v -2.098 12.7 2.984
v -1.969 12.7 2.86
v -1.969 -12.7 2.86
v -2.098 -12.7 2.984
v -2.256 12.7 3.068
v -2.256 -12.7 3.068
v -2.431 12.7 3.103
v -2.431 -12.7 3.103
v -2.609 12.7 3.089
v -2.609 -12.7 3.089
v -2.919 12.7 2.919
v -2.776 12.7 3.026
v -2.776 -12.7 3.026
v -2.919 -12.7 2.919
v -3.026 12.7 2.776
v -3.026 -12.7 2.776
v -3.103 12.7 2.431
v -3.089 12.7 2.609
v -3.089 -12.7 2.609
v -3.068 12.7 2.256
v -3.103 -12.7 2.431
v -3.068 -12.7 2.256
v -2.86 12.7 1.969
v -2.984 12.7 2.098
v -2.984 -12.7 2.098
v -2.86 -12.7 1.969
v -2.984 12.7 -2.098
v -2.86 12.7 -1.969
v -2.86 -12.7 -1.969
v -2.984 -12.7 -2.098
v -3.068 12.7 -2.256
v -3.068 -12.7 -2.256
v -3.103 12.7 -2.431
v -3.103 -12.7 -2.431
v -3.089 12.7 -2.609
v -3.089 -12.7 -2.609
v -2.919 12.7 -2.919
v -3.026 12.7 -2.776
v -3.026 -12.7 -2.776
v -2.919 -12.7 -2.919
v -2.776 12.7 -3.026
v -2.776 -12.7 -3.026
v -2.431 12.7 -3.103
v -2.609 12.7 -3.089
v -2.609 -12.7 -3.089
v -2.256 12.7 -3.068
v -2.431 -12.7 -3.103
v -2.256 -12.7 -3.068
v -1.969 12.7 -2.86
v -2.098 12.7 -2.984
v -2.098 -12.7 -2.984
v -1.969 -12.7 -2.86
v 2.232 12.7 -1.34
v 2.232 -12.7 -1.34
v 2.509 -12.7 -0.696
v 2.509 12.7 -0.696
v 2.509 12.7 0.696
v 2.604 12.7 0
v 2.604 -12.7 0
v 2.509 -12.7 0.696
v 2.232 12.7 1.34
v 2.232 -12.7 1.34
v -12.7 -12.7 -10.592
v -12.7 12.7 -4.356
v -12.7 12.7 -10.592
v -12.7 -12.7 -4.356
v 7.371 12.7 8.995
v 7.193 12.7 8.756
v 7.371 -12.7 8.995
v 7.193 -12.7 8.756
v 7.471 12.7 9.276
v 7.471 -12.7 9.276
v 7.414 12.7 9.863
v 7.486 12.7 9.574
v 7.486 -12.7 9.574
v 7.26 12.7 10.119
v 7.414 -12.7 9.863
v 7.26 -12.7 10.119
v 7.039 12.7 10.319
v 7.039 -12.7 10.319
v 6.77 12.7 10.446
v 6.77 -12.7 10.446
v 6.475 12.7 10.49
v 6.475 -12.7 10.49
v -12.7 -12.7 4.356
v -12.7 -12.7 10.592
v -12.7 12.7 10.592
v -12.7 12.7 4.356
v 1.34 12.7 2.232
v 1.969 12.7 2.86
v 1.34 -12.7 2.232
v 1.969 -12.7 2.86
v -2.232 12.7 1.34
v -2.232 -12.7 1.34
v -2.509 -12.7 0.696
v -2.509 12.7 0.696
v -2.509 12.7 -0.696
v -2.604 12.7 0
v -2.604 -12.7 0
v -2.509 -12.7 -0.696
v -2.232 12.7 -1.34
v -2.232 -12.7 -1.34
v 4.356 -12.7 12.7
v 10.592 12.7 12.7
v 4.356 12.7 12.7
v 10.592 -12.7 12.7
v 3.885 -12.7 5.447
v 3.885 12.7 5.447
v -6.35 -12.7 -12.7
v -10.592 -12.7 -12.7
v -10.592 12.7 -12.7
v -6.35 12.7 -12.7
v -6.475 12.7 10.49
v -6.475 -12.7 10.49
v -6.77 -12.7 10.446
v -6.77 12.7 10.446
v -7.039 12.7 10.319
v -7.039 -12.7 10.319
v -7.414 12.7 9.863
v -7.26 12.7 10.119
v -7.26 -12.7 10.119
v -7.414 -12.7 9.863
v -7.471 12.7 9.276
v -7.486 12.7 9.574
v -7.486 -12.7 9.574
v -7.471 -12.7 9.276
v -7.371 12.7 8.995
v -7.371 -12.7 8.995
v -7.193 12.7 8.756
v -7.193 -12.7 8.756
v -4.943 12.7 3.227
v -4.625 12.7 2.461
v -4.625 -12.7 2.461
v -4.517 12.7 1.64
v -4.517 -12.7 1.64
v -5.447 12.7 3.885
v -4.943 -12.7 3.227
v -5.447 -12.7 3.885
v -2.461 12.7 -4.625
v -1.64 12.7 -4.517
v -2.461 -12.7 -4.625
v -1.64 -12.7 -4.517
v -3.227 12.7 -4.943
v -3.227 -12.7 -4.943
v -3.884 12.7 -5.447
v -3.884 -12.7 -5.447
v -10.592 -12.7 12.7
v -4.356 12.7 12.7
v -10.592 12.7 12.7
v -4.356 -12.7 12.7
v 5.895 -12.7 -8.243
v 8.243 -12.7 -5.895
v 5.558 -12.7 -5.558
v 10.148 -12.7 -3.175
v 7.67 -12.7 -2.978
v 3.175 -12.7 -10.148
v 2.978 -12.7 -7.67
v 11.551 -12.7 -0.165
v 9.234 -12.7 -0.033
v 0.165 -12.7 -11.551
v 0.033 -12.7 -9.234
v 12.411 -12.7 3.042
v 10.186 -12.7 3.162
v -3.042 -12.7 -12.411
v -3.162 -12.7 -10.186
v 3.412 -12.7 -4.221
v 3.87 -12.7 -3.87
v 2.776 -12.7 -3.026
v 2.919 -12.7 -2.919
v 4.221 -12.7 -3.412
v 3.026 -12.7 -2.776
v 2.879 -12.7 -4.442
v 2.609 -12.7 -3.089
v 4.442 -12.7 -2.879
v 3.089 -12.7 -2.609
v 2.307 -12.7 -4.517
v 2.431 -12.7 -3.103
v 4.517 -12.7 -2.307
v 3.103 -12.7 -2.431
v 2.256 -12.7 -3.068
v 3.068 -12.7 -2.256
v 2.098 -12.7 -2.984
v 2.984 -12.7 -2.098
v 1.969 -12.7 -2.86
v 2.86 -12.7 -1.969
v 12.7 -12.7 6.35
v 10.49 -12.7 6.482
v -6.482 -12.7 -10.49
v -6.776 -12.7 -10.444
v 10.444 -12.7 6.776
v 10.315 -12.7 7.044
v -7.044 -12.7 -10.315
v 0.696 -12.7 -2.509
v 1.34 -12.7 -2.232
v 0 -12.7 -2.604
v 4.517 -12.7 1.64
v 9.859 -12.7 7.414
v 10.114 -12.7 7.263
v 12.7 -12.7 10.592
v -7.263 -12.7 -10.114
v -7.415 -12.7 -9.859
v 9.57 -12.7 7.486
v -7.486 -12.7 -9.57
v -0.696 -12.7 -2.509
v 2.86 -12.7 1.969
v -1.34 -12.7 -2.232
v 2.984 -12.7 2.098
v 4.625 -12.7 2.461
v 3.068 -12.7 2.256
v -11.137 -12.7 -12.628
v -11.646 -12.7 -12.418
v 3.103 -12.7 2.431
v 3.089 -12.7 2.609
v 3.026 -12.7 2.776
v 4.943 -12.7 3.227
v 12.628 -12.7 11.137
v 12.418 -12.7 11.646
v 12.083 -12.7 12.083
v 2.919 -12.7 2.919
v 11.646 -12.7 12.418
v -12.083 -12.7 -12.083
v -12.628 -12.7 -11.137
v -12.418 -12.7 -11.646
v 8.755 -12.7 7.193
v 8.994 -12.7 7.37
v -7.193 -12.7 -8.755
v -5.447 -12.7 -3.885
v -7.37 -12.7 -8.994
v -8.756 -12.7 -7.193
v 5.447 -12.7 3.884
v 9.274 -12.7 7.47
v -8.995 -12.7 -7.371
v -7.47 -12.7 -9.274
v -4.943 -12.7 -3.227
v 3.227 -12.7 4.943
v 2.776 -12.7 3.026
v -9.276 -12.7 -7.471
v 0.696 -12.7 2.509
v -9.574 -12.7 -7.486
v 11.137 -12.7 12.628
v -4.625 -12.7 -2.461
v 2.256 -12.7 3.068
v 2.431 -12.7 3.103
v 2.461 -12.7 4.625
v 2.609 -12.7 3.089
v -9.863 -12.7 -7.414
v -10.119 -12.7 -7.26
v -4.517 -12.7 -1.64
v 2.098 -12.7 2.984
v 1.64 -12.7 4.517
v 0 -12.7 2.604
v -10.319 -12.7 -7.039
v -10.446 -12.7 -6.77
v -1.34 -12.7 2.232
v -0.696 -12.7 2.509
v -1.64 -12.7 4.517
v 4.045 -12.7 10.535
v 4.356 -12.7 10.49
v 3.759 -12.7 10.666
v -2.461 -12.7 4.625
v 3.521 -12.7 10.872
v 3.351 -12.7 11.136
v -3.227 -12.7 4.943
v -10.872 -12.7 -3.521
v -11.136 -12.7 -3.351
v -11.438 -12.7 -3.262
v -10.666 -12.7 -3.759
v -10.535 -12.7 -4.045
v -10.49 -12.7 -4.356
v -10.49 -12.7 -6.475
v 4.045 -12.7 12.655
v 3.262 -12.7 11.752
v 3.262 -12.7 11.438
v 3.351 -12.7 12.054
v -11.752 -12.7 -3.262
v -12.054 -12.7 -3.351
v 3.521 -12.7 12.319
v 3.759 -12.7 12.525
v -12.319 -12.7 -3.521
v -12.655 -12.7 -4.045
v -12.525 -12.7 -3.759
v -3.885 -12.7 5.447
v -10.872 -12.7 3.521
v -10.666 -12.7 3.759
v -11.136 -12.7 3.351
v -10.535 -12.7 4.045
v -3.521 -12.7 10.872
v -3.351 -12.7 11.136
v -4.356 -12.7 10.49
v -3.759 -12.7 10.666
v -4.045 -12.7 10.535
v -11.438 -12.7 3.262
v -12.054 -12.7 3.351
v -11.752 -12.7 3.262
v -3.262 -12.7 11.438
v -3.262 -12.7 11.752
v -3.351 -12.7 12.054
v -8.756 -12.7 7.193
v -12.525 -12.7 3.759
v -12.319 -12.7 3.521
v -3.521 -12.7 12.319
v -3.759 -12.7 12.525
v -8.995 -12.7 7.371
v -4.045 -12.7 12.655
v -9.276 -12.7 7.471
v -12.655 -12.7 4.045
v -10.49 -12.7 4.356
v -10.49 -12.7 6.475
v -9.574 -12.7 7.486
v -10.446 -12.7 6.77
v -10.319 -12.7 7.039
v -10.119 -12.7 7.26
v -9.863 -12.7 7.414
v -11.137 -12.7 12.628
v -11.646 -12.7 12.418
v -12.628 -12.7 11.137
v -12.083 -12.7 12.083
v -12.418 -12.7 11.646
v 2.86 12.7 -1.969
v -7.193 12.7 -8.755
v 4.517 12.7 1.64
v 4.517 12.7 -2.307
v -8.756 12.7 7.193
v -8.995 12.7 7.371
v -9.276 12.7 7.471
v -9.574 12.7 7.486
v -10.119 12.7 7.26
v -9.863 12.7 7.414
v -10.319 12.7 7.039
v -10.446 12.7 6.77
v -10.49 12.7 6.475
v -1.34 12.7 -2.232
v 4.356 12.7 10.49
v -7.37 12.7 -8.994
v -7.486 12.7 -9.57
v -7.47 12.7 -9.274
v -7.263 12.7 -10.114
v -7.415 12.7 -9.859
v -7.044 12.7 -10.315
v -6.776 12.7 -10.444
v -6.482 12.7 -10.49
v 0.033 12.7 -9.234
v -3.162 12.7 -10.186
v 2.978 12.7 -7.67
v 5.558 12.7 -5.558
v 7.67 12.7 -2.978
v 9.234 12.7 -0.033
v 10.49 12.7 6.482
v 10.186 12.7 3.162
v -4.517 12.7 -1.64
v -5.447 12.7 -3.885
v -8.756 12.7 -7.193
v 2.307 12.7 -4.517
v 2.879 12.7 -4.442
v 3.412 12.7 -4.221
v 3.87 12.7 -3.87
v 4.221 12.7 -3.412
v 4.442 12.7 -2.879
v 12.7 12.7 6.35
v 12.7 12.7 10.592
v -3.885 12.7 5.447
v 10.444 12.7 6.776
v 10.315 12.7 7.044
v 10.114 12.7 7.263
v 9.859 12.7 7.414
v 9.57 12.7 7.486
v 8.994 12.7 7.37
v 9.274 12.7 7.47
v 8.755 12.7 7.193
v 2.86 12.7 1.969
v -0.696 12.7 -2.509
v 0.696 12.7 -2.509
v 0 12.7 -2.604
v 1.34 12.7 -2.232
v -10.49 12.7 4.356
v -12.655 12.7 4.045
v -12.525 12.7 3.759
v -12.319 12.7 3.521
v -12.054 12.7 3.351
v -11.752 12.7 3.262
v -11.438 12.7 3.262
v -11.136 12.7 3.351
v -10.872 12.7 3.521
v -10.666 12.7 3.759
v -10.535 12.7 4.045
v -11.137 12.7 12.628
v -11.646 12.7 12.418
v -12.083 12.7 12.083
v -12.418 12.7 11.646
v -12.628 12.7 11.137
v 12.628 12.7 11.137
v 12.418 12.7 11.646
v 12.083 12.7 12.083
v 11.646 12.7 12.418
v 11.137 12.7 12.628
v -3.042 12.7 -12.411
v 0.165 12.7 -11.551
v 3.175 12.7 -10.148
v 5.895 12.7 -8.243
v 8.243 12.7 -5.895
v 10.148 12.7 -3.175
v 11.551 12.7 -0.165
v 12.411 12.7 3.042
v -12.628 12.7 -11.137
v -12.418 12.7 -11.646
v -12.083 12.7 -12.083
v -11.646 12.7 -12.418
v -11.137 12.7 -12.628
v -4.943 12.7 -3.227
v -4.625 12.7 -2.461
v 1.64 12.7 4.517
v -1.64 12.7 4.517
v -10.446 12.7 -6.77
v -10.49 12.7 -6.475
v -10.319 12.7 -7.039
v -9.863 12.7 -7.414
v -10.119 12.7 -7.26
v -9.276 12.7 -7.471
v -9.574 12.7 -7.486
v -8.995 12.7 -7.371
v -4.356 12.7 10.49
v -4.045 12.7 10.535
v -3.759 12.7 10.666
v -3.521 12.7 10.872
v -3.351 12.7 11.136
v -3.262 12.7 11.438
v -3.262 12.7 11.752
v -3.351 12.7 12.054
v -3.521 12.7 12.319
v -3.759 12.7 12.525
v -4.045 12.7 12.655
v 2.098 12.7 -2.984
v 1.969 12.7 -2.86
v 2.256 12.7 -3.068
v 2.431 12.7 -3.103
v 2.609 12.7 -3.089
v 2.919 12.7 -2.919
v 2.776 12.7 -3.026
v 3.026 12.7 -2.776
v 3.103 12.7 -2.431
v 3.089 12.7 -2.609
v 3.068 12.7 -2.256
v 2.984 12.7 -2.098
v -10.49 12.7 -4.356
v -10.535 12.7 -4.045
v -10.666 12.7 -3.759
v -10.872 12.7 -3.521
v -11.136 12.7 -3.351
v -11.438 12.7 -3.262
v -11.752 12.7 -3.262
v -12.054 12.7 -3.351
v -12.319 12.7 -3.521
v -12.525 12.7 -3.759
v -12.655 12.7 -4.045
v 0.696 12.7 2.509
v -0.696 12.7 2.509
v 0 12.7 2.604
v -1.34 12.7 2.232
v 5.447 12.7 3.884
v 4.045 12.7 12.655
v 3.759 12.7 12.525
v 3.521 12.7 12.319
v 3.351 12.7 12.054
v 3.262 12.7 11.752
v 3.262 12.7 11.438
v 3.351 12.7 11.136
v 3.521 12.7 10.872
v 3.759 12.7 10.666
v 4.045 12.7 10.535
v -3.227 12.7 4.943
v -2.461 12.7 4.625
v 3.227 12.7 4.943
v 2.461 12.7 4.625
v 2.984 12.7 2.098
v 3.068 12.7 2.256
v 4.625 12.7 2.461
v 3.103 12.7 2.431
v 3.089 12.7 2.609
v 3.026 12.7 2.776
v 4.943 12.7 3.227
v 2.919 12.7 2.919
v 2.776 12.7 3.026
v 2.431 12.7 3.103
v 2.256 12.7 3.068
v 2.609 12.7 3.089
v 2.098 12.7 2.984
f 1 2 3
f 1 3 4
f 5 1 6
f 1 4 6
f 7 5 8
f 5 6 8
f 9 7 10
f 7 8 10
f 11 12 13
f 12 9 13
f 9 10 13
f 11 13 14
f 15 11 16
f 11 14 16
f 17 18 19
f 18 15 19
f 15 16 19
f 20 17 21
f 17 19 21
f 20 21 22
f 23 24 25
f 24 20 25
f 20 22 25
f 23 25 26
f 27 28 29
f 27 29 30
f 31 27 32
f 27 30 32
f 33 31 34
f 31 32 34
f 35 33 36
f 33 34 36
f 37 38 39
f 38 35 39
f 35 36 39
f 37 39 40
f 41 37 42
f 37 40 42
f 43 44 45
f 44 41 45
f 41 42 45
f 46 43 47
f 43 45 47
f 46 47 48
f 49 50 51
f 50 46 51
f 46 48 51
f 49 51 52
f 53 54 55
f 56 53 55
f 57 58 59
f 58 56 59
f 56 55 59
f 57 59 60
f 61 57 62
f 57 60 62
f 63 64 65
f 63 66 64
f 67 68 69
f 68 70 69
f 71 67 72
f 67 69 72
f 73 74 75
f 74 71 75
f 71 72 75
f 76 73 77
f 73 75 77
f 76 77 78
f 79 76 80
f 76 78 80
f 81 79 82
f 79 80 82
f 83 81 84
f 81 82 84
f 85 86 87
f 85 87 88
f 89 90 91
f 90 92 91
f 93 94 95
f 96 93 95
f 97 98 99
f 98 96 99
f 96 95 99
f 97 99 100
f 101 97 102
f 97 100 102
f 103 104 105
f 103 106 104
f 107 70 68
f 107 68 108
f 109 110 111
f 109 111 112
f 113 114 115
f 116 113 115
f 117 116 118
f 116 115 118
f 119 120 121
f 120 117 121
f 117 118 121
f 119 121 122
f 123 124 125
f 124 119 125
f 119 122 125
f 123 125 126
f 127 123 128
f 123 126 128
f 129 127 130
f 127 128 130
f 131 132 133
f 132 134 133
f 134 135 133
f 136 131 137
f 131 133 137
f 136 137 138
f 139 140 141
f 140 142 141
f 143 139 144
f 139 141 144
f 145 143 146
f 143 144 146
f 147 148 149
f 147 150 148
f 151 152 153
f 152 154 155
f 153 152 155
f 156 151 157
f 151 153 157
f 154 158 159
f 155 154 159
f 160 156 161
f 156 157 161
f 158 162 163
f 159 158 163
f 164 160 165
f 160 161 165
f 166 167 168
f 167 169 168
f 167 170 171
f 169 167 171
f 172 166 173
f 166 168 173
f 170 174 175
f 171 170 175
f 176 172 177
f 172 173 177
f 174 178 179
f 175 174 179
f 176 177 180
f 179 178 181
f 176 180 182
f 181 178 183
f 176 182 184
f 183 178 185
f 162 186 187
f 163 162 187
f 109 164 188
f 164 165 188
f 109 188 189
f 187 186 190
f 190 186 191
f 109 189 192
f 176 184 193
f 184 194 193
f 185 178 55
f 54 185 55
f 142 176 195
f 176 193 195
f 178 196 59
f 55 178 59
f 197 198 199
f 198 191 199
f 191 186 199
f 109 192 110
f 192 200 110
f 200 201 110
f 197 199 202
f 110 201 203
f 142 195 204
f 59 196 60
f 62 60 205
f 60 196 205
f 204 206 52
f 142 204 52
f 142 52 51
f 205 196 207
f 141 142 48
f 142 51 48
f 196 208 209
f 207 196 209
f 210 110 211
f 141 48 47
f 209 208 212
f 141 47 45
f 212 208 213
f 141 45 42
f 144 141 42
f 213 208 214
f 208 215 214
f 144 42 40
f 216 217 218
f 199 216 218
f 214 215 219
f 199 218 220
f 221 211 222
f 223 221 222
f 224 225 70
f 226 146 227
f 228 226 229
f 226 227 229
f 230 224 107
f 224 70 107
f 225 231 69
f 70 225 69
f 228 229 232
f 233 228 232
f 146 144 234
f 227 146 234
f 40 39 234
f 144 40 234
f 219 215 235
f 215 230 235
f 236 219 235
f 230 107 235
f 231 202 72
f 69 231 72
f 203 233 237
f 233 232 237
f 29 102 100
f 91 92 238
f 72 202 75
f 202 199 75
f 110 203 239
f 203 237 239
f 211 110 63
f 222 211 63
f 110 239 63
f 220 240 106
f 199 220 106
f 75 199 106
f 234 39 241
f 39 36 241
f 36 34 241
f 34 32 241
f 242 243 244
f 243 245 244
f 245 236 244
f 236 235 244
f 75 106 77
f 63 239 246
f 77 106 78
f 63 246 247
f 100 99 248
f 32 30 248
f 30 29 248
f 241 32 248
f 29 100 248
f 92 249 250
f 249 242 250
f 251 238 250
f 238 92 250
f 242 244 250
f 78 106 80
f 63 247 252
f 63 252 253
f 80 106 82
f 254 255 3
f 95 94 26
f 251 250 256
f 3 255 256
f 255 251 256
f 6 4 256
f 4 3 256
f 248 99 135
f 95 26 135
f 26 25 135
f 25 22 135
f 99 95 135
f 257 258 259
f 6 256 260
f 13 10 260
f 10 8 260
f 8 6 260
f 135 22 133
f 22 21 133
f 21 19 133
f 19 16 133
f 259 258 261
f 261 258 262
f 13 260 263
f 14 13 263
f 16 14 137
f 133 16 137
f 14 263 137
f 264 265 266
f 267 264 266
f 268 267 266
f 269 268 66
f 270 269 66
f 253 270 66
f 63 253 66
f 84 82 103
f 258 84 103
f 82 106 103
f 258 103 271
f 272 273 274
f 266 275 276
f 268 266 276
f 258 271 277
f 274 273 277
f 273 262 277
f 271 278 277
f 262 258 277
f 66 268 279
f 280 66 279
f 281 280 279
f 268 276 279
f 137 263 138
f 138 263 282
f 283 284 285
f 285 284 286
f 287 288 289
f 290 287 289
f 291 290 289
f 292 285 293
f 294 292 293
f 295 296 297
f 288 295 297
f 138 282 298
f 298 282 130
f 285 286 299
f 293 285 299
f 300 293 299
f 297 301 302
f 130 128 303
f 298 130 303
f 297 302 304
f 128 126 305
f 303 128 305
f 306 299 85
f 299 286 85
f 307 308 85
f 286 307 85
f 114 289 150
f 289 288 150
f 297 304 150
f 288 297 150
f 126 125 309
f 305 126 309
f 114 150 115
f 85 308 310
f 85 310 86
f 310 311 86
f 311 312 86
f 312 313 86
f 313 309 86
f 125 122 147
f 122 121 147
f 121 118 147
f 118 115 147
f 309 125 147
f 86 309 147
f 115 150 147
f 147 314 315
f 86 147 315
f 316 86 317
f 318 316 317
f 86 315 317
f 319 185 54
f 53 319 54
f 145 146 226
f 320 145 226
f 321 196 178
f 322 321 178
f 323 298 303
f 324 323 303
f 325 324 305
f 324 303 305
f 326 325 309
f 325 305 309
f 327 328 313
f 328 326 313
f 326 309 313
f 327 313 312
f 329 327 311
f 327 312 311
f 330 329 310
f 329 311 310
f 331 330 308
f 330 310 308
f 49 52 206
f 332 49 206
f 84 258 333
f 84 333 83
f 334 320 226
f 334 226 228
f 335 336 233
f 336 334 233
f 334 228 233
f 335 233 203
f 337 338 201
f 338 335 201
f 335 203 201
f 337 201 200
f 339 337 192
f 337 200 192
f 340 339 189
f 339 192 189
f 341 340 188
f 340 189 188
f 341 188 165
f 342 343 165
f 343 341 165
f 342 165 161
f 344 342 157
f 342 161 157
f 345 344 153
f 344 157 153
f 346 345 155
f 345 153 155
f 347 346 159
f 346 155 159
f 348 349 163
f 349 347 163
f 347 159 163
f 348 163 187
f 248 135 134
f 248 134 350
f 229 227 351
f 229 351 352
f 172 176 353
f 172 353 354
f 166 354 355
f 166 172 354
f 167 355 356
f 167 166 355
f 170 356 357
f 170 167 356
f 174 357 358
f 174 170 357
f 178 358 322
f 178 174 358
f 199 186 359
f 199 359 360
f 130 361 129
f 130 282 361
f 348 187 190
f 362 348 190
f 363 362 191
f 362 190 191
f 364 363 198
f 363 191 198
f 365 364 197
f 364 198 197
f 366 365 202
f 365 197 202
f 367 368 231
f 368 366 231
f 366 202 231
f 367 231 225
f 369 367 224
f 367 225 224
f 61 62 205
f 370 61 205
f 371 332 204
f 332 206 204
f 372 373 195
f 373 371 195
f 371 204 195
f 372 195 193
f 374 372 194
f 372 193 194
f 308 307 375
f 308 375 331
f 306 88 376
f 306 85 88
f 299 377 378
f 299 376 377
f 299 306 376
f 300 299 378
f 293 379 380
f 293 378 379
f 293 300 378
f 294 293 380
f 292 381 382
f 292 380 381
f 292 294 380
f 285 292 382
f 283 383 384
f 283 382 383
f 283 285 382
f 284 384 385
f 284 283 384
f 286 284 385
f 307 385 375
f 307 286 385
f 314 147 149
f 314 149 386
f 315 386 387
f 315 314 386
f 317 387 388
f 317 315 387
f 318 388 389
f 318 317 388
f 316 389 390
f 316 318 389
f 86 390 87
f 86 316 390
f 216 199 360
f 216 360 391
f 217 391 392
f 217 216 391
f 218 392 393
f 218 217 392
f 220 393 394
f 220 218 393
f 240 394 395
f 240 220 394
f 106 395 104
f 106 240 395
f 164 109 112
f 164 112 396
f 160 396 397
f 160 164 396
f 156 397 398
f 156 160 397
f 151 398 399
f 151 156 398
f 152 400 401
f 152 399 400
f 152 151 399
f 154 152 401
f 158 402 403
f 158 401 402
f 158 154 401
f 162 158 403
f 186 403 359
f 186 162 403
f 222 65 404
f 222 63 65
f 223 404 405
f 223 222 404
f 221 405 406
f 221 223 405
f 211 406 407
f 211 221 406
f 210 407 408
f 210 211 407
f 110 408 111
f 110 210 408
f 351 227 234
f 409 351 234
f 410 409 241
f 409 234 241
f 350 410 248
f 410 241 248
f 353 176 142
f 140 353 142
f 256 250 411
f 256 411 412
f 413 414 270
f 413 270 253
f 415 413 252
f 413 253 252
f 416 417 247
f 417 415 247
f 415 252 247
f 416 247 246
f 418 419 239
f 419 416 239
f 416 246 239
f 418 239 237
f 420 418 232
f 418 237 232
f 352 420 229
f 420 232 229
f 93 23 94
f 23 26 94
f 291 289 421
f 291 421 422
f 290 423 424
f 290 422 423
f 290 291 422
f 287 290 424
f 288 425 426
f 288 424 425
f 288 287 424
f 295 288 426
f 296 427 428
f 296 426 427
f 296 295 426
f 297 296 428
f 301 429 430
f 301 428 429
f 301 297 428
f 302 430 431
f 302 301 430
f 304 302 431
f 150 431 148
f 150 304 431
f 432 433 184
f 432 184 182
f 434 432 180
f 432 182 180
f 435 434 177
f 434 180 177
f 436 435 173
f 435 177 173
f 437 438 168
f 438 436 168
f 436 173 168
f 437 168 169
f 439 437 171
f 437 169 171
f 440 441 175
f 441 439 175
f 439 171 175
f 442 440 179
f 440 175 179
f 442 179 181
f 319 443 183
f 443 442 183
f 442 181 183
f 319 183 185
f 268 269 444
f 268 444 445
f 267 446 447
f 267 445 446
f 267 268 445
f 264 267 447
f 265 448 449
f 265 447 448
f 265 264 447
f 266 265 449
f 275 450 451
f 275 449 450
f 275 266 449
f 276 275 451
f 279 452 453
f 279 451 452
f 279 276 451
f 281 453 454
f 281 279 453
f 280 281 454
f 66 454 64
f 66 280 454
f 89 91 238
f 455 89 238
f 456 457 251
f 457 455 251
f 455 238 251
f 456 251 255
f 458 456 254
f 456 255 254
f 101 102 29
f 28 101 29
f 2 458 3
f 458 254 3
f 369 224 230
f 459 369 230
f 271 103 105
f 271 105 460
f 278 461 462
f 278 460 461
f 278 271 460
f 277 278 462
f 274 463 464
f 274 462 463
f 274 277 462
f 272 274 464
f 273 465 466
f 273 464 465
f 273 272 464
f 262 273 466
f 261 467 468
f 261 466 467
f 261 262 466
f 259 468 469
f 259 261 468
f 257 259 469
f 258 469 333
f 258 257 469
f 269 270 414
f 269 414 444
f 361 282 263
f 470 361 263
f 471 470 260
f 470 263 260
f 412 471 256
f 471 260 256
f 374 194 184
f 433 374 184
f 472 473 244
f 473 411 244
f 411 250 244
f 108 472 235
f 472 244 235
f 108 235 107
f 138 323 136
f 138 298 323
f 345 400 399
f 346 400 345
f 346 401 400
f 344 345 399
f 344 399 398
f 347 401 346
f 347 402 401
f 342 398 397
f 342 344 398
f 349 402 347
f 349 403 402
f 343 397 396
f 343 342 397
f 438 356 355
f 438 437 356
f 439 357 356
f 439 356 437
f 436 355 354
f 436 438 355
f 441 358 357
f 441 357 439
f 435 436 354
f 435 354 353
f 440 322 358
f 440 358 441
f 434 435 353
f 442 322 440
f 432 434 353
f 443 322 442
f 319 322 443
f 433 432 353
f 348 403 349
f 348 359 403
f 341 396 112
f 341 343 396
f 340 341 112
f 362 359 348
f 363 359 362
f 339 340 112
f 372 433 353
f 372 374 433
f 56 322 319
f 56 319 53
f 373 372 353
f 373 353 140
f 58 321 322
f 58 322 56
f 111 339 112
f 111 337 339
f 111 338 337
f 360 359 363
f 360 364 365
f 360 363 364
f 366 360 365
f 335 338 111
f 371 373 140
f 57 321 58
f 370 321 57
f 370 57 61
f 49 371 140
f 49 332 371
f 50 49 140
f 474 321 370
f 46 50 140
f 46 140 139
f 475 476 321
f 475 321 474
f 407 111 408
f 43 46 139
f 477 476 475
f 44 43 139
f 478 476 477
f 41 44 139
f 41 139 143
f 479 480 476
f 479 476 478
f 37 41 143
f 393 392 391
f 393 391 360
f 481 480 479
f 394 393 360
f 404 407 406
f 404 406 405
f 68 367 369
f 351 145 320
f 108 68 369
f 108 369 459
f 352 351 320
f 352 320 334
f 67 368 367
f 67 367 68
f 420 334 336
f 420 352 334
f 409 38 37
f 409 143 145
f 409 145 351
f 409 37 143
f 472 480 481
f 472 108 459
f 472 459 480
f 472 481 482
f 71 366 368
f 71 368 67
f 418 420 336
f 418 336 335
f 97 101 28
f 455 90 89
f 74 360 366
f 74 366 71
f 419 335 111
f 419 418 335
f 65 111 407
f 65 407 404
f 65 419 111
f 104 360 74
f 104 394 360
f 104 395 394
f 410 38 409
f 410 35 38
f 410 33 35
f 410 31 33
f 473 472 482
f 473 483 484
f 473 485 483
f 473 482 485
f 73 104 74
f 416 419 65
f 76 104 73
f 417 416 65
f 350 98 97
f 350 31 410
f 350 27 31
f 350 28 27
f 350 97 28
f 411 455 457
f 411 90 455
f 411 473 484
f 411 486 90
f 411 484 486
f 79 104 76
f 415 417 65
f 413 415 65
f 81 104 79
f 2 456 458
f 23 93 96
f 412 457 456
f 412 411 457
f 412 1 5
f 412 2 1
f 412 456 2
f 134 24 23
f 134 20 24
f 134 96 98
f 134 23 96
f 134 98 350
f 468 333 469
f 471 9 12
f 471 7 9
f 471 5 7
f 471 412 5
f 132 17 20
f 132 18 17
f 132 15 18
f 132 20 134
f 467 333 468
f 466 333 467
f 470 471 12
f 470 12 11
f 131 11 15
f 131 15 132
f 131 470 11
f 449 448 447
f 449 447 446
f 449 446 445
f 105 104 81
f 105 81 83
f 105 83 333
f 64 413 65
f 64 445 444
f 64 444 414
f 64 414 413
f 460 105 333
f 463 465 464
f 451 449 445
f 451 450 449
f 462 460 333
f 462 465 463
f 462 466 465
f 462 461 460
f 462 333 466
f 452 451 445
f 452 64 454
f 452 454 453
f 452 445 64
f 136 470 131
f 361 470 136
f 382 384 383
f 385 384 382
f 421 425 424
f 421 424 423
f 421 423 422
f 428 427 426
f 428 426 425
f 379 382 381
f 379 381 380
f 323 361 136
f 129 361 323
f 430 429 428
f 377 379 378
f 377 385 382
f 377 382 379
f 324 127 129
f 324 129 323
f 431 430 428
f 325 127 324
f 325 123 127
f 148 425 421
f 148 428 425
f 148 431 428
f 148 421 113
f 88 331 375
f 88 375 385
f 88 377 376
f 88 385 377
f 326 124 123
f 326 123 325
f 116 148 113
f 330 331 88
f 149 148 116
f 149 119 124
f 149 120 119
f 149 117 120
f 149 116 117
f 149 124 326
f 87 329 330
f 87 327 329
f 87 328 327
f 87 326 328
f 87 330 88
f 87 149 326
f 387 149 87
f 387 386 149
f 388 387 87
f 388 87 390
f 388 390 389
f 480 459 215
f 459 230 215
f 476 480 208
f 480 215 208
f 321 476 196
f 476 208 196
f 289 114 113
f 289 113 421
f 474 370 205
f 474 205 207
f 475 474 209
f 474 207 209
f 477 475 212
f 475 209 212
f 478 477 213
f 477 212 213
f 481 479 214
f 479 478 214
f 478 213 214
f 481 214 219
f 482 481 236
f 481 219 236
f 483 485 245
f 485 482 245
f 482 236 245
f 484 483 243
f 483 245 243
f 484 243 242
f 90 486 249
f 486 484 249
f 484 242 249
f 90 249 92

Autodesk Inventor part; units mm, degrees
ref_plane "YZ Plane" through (0, 0, 0) normal (1, 0, 0) x (0, 1, 0)
ref_plane "XZ Plane" through (0, 0, 0) normal (0, 1, 0) x (-1, 0, 0)
ref_plane "XY Plane" through (0, 0, 0) normal (0, 0, 1) x (1, 0, 0)
sketch "Sketch1" plane through (0, 0, 0) normal (0, 1, 0) x (-1, 0, 0)
  arc A0 (-4.5172, 1.6395) -> (-5.4471, 3.8845) centre (-7.6922, 1.6395) ccw
  line L0 (-8.7553, 7.1927) -> (-5.4471, 3.8845)
  arc A1 (-8.7553, 7.1927) -> (-10.4897, 6.4823) centre (-9.4737, 6.4743) ccw
  arc A2 (-10.4897, 6.4823) -> (6.4823, -10.4897) centre (6.35, 6.35) ccw
  arc A3 (6.4823, -10.4897) -> (7.1927, -8.7553) centre (6.4743, -9.4737) ccw
  line L1 (3.8845, -5.4471) -> (7.1927, -8.7553)
  arc A4 (3.8845, -5.4471) -> (1.6395, -4.5172) centre (1.6395, -7.6922) ccw
  line L2 (-2.3074, -4.5172) -> (1.6395, -4.5172)
  arc A5 (-4.5172, -2.3074) -> (-2.3074, -4.5172) centre (-2.3074, -2.3074) ccw
  line L3 (-4.5172, 1.6395) -> (-4.5172, -2.3074)
  arc A6 (-2.2319, 1.3405) -> (-2.2319, -1.3405) centre (0, 0) ccw
  line L4 (-2.8605, -1.9692) -> (-2.2319, -1.3405)
  arc A7 (-2.8605, -1.9692) -> (-1.9692, -2.8605) centre (-2.4696, -2.4696) ccw
  line L5 (-1.3405, -2.2319) -> (-1.9692, -2.8605)
  arc A8 (-1.3405, -2.2319) -> (1.3405, -2.2319) centre (0, 0) ccw
  line L6 (1.9692, -2.8605) -> (1.3405, -2.2319)
  arc A9 (1.9692, -2.8605) -> (2.8605, -1.9692) centre (2.4696, -2.4696) ccw
  line L7 (2.2319, -1.3405) -> (2.8605, -1.9692)
  arc A10 (2.2319, -1.3405) -> (2.2319, 1.3405) centre (0, 0) ccw
  line L8 (2.8605, 1.9692) -> (2.2319, 1.3405)
  arc A11 (2.8605, 1.9692) -> (1.9692, 2.8605) centre (2.4696, 2.4696) ccw
  line L9 (1.3405, 2.2319) -> (1.9692, 2.8605)
  arc A12 (1.3405, 2.2319) -> (-1.3405, 2.2319) centre (0, 0) ccw
  line L10 (-1.9692, 2.8605) -> (-1.3405, 2.2319)
  arc A13 (-1.9692, 2.8605) -> (-2.8605, 1.9692) centre (-2.4696, 2.4696) ccw
  line L11 (-2.2319, 1.3405) -> (-2.8605, 1.9692)
  arc A14 (12.7, -4.3561) -> (10.4902, -4.3561) centre (11.5951, -4.3561) ccw
  line L12 (12.7, -4.3561) -> (12.7, -10.5918)
  arc A15 (10.5918, -12.7) -> (12.7, -10.5918) centre (10.5918, -10.5918) ccw
  line L13 (10.5918, -12.7) -> (6.35, -12.7)
  arc A16 (-12.7, 6.35) -> (6.35, -12.7) centre (6.35, 6.35) ccw
  line L14 (-12.7, 6.35) -> (-12.7, 10.5918)
  arc A17 (-10.5918, 12.7) -> (-12.7, 10.5918) centre (-10.5918, 10.5918) ccw
  line L15 (-10.5918, 12.7) -> (-4.3561, 12.7)
  arc A18 (-4.3561, 10.4902) -> (-4.3561, 12.7) centre (-4.3561, 11.5951) ccw
  line L16 (-4.3561, 10.4902) -> (-6.4749, 10.4902)
  arc A19 (-6.4749, 10.4902) -> (-7.1933, 8.7558) centre (-6.4749, 9.4742) ccw
  line L17 (-7.1933, 8.7558) -> (-3.8846, 5.4471)
  arc A20 (-3.8846, 5.4471) -> (-1.6396, 4.5172) centre (-1.6396, 7.6922) ccw
  line L18 (-1.6396, 4.5172) -> (1.6396, 4.5172)
  arc A21 (1.6396, 4.5172) -> (3.8846, 5.4471) centre (1.6396, 7.6922) ccw
  line L19 (3.8846, 5.4471) -> (7.1933, 8.7558)
  arc A22 (7.1933, 8.7558) -> (6.4749, 10.4902) centre (6.4749, 9.4742) ccw
  line L20 (6.4749, 10.4902) -> (4.3561, 10.4902)
  arc A23 (4.3561, 12.7) -> (4.3561, 10.4902) centre (4.3561, 11.5951) ccw
  line L21 (4.3561, 12.7) -> (10.5918, 12.7)
  arc A24 (12.7, 10.5918) -> (10.5918, 12.7) centre (10.5918, 10.5918) ccw
  line L22 (12.7, 10.5918) -> (12.7, 4.3561)
  arc A25 (10.4902, 4.3561) -> (12.7, 4.3561) centre (11.5951, 4.3561) ccw
  line L23 (10.4902, 4.3561) -> (10.4902, 6.4749)
  arc A26 (10.4902, 6.4749) -> (8.7558, 7.1933) centre (9.4742, 6.4749) ccw
  line L24 (8.7558, 7.1933) -> (5.4471, 3.8846)
  arc A27 (5.4471, 3.8846) -> (4.5172, 1.6396) centre (7.6922, 1.6396) ccw
  line L25 (4.5172, 1.6396) -> (4.5172, -1.6396)
  arc A28 (4.5172, -1.6396) -> (5.4471, -3.8846) centre (7.6922, -1.6396) ccw
  line L26 (5.4471, -3.8846) -> (8.7558, -7.1933)
  arc A29 (8.7558, -7.1933) -> (10.4902, -6.4749) centre (9.4742, -6.4749) ccw
  line L27 (10.4902, -6.4749) -> (10.4902, -4.3561)
  point P0 (0, 0)
  dimension "d0" = 1.1049
  dimension "d1" = 2.1082
  dimension "d2" = 1.016
  dimension "d3" = 3.175
  dimension "d4" = 19.05
  dimension "d5" = 16.8402
  dimension "d6" = 0.635
  dimension "d7" = 2.6035
  dimension "d8" = 2.6035
  dimension "d9" = 2.6035
  dimension "d10" = 2.6035
  dimension "d11" = 2.2098
  dimension "d12" = 45
  dimension "d13" = 45
  dimension "d14" = 45
  dimension "d15" = 45
  dimension "d16" = 45
  dimension "d17" = 45
  dimension "d18" = 90
  dimension "d19" = 45
  dimension "d20" = 90
  dimension "d21" = 90
  dimension "d22" = 90
  dimension "d23" = 8.1828
  dimension "d24" = 17.2172
  dimension "d25" = 25.4
  dimension "d26" = 25.4
  dimension "d27" = 17.2172
  dimension "d28" = 8.1828
  dimension "d29" = 2.2096
  dimension "d30" = 1.7351
  dimension "d31" = 0.4746
  dimension "d32" = 1.7352
  dimension "d33" = 0.4746
  dimension "d34" = 2.2097
  dimension "d35" = 12.7
  dimension "d36" = 12.7
  dimension "d37" = 10.4902
  dimension "d38" = 12.7
  dimension "d39" = 1.1048
  dimension "d40" = 1.1048
  dimension "d41" = 1.1049
  dimension "d42" = 0.6303
  dimension "d43" = 0.6303
  dimension "d44" = 0.6303
  dimension "d45" = 0.6303
  dimension "d46" = 10.4902
  dimension "d47" = 1.1049
  dimension "d48" = 12.7
  dimension "d49" = 17.0561
  dimension "d50" = 8.3439
  dimension "d51" = 8.3439
  dimension "d52" = 9.8395
  dimension "d53" = 9.8395
  dimension "d54" = 10.2304
  dimension "d55" = 10.2304
  dimension "d56" = 10.4681
  dimension "d57" = 10.4681
  dimension "d58" = 14.6692
  dimension "d59" = 14.6692
  dimension "d60" = 15.1696
  dimension "d61" = 15.1696
  dimension "d62" = 17.0561
extrude "Extrusion1" add sketch "Sketch1" along normal mid plane 25.4
properties part number "1012-S-BLACK-FB" material "6105-T5"
